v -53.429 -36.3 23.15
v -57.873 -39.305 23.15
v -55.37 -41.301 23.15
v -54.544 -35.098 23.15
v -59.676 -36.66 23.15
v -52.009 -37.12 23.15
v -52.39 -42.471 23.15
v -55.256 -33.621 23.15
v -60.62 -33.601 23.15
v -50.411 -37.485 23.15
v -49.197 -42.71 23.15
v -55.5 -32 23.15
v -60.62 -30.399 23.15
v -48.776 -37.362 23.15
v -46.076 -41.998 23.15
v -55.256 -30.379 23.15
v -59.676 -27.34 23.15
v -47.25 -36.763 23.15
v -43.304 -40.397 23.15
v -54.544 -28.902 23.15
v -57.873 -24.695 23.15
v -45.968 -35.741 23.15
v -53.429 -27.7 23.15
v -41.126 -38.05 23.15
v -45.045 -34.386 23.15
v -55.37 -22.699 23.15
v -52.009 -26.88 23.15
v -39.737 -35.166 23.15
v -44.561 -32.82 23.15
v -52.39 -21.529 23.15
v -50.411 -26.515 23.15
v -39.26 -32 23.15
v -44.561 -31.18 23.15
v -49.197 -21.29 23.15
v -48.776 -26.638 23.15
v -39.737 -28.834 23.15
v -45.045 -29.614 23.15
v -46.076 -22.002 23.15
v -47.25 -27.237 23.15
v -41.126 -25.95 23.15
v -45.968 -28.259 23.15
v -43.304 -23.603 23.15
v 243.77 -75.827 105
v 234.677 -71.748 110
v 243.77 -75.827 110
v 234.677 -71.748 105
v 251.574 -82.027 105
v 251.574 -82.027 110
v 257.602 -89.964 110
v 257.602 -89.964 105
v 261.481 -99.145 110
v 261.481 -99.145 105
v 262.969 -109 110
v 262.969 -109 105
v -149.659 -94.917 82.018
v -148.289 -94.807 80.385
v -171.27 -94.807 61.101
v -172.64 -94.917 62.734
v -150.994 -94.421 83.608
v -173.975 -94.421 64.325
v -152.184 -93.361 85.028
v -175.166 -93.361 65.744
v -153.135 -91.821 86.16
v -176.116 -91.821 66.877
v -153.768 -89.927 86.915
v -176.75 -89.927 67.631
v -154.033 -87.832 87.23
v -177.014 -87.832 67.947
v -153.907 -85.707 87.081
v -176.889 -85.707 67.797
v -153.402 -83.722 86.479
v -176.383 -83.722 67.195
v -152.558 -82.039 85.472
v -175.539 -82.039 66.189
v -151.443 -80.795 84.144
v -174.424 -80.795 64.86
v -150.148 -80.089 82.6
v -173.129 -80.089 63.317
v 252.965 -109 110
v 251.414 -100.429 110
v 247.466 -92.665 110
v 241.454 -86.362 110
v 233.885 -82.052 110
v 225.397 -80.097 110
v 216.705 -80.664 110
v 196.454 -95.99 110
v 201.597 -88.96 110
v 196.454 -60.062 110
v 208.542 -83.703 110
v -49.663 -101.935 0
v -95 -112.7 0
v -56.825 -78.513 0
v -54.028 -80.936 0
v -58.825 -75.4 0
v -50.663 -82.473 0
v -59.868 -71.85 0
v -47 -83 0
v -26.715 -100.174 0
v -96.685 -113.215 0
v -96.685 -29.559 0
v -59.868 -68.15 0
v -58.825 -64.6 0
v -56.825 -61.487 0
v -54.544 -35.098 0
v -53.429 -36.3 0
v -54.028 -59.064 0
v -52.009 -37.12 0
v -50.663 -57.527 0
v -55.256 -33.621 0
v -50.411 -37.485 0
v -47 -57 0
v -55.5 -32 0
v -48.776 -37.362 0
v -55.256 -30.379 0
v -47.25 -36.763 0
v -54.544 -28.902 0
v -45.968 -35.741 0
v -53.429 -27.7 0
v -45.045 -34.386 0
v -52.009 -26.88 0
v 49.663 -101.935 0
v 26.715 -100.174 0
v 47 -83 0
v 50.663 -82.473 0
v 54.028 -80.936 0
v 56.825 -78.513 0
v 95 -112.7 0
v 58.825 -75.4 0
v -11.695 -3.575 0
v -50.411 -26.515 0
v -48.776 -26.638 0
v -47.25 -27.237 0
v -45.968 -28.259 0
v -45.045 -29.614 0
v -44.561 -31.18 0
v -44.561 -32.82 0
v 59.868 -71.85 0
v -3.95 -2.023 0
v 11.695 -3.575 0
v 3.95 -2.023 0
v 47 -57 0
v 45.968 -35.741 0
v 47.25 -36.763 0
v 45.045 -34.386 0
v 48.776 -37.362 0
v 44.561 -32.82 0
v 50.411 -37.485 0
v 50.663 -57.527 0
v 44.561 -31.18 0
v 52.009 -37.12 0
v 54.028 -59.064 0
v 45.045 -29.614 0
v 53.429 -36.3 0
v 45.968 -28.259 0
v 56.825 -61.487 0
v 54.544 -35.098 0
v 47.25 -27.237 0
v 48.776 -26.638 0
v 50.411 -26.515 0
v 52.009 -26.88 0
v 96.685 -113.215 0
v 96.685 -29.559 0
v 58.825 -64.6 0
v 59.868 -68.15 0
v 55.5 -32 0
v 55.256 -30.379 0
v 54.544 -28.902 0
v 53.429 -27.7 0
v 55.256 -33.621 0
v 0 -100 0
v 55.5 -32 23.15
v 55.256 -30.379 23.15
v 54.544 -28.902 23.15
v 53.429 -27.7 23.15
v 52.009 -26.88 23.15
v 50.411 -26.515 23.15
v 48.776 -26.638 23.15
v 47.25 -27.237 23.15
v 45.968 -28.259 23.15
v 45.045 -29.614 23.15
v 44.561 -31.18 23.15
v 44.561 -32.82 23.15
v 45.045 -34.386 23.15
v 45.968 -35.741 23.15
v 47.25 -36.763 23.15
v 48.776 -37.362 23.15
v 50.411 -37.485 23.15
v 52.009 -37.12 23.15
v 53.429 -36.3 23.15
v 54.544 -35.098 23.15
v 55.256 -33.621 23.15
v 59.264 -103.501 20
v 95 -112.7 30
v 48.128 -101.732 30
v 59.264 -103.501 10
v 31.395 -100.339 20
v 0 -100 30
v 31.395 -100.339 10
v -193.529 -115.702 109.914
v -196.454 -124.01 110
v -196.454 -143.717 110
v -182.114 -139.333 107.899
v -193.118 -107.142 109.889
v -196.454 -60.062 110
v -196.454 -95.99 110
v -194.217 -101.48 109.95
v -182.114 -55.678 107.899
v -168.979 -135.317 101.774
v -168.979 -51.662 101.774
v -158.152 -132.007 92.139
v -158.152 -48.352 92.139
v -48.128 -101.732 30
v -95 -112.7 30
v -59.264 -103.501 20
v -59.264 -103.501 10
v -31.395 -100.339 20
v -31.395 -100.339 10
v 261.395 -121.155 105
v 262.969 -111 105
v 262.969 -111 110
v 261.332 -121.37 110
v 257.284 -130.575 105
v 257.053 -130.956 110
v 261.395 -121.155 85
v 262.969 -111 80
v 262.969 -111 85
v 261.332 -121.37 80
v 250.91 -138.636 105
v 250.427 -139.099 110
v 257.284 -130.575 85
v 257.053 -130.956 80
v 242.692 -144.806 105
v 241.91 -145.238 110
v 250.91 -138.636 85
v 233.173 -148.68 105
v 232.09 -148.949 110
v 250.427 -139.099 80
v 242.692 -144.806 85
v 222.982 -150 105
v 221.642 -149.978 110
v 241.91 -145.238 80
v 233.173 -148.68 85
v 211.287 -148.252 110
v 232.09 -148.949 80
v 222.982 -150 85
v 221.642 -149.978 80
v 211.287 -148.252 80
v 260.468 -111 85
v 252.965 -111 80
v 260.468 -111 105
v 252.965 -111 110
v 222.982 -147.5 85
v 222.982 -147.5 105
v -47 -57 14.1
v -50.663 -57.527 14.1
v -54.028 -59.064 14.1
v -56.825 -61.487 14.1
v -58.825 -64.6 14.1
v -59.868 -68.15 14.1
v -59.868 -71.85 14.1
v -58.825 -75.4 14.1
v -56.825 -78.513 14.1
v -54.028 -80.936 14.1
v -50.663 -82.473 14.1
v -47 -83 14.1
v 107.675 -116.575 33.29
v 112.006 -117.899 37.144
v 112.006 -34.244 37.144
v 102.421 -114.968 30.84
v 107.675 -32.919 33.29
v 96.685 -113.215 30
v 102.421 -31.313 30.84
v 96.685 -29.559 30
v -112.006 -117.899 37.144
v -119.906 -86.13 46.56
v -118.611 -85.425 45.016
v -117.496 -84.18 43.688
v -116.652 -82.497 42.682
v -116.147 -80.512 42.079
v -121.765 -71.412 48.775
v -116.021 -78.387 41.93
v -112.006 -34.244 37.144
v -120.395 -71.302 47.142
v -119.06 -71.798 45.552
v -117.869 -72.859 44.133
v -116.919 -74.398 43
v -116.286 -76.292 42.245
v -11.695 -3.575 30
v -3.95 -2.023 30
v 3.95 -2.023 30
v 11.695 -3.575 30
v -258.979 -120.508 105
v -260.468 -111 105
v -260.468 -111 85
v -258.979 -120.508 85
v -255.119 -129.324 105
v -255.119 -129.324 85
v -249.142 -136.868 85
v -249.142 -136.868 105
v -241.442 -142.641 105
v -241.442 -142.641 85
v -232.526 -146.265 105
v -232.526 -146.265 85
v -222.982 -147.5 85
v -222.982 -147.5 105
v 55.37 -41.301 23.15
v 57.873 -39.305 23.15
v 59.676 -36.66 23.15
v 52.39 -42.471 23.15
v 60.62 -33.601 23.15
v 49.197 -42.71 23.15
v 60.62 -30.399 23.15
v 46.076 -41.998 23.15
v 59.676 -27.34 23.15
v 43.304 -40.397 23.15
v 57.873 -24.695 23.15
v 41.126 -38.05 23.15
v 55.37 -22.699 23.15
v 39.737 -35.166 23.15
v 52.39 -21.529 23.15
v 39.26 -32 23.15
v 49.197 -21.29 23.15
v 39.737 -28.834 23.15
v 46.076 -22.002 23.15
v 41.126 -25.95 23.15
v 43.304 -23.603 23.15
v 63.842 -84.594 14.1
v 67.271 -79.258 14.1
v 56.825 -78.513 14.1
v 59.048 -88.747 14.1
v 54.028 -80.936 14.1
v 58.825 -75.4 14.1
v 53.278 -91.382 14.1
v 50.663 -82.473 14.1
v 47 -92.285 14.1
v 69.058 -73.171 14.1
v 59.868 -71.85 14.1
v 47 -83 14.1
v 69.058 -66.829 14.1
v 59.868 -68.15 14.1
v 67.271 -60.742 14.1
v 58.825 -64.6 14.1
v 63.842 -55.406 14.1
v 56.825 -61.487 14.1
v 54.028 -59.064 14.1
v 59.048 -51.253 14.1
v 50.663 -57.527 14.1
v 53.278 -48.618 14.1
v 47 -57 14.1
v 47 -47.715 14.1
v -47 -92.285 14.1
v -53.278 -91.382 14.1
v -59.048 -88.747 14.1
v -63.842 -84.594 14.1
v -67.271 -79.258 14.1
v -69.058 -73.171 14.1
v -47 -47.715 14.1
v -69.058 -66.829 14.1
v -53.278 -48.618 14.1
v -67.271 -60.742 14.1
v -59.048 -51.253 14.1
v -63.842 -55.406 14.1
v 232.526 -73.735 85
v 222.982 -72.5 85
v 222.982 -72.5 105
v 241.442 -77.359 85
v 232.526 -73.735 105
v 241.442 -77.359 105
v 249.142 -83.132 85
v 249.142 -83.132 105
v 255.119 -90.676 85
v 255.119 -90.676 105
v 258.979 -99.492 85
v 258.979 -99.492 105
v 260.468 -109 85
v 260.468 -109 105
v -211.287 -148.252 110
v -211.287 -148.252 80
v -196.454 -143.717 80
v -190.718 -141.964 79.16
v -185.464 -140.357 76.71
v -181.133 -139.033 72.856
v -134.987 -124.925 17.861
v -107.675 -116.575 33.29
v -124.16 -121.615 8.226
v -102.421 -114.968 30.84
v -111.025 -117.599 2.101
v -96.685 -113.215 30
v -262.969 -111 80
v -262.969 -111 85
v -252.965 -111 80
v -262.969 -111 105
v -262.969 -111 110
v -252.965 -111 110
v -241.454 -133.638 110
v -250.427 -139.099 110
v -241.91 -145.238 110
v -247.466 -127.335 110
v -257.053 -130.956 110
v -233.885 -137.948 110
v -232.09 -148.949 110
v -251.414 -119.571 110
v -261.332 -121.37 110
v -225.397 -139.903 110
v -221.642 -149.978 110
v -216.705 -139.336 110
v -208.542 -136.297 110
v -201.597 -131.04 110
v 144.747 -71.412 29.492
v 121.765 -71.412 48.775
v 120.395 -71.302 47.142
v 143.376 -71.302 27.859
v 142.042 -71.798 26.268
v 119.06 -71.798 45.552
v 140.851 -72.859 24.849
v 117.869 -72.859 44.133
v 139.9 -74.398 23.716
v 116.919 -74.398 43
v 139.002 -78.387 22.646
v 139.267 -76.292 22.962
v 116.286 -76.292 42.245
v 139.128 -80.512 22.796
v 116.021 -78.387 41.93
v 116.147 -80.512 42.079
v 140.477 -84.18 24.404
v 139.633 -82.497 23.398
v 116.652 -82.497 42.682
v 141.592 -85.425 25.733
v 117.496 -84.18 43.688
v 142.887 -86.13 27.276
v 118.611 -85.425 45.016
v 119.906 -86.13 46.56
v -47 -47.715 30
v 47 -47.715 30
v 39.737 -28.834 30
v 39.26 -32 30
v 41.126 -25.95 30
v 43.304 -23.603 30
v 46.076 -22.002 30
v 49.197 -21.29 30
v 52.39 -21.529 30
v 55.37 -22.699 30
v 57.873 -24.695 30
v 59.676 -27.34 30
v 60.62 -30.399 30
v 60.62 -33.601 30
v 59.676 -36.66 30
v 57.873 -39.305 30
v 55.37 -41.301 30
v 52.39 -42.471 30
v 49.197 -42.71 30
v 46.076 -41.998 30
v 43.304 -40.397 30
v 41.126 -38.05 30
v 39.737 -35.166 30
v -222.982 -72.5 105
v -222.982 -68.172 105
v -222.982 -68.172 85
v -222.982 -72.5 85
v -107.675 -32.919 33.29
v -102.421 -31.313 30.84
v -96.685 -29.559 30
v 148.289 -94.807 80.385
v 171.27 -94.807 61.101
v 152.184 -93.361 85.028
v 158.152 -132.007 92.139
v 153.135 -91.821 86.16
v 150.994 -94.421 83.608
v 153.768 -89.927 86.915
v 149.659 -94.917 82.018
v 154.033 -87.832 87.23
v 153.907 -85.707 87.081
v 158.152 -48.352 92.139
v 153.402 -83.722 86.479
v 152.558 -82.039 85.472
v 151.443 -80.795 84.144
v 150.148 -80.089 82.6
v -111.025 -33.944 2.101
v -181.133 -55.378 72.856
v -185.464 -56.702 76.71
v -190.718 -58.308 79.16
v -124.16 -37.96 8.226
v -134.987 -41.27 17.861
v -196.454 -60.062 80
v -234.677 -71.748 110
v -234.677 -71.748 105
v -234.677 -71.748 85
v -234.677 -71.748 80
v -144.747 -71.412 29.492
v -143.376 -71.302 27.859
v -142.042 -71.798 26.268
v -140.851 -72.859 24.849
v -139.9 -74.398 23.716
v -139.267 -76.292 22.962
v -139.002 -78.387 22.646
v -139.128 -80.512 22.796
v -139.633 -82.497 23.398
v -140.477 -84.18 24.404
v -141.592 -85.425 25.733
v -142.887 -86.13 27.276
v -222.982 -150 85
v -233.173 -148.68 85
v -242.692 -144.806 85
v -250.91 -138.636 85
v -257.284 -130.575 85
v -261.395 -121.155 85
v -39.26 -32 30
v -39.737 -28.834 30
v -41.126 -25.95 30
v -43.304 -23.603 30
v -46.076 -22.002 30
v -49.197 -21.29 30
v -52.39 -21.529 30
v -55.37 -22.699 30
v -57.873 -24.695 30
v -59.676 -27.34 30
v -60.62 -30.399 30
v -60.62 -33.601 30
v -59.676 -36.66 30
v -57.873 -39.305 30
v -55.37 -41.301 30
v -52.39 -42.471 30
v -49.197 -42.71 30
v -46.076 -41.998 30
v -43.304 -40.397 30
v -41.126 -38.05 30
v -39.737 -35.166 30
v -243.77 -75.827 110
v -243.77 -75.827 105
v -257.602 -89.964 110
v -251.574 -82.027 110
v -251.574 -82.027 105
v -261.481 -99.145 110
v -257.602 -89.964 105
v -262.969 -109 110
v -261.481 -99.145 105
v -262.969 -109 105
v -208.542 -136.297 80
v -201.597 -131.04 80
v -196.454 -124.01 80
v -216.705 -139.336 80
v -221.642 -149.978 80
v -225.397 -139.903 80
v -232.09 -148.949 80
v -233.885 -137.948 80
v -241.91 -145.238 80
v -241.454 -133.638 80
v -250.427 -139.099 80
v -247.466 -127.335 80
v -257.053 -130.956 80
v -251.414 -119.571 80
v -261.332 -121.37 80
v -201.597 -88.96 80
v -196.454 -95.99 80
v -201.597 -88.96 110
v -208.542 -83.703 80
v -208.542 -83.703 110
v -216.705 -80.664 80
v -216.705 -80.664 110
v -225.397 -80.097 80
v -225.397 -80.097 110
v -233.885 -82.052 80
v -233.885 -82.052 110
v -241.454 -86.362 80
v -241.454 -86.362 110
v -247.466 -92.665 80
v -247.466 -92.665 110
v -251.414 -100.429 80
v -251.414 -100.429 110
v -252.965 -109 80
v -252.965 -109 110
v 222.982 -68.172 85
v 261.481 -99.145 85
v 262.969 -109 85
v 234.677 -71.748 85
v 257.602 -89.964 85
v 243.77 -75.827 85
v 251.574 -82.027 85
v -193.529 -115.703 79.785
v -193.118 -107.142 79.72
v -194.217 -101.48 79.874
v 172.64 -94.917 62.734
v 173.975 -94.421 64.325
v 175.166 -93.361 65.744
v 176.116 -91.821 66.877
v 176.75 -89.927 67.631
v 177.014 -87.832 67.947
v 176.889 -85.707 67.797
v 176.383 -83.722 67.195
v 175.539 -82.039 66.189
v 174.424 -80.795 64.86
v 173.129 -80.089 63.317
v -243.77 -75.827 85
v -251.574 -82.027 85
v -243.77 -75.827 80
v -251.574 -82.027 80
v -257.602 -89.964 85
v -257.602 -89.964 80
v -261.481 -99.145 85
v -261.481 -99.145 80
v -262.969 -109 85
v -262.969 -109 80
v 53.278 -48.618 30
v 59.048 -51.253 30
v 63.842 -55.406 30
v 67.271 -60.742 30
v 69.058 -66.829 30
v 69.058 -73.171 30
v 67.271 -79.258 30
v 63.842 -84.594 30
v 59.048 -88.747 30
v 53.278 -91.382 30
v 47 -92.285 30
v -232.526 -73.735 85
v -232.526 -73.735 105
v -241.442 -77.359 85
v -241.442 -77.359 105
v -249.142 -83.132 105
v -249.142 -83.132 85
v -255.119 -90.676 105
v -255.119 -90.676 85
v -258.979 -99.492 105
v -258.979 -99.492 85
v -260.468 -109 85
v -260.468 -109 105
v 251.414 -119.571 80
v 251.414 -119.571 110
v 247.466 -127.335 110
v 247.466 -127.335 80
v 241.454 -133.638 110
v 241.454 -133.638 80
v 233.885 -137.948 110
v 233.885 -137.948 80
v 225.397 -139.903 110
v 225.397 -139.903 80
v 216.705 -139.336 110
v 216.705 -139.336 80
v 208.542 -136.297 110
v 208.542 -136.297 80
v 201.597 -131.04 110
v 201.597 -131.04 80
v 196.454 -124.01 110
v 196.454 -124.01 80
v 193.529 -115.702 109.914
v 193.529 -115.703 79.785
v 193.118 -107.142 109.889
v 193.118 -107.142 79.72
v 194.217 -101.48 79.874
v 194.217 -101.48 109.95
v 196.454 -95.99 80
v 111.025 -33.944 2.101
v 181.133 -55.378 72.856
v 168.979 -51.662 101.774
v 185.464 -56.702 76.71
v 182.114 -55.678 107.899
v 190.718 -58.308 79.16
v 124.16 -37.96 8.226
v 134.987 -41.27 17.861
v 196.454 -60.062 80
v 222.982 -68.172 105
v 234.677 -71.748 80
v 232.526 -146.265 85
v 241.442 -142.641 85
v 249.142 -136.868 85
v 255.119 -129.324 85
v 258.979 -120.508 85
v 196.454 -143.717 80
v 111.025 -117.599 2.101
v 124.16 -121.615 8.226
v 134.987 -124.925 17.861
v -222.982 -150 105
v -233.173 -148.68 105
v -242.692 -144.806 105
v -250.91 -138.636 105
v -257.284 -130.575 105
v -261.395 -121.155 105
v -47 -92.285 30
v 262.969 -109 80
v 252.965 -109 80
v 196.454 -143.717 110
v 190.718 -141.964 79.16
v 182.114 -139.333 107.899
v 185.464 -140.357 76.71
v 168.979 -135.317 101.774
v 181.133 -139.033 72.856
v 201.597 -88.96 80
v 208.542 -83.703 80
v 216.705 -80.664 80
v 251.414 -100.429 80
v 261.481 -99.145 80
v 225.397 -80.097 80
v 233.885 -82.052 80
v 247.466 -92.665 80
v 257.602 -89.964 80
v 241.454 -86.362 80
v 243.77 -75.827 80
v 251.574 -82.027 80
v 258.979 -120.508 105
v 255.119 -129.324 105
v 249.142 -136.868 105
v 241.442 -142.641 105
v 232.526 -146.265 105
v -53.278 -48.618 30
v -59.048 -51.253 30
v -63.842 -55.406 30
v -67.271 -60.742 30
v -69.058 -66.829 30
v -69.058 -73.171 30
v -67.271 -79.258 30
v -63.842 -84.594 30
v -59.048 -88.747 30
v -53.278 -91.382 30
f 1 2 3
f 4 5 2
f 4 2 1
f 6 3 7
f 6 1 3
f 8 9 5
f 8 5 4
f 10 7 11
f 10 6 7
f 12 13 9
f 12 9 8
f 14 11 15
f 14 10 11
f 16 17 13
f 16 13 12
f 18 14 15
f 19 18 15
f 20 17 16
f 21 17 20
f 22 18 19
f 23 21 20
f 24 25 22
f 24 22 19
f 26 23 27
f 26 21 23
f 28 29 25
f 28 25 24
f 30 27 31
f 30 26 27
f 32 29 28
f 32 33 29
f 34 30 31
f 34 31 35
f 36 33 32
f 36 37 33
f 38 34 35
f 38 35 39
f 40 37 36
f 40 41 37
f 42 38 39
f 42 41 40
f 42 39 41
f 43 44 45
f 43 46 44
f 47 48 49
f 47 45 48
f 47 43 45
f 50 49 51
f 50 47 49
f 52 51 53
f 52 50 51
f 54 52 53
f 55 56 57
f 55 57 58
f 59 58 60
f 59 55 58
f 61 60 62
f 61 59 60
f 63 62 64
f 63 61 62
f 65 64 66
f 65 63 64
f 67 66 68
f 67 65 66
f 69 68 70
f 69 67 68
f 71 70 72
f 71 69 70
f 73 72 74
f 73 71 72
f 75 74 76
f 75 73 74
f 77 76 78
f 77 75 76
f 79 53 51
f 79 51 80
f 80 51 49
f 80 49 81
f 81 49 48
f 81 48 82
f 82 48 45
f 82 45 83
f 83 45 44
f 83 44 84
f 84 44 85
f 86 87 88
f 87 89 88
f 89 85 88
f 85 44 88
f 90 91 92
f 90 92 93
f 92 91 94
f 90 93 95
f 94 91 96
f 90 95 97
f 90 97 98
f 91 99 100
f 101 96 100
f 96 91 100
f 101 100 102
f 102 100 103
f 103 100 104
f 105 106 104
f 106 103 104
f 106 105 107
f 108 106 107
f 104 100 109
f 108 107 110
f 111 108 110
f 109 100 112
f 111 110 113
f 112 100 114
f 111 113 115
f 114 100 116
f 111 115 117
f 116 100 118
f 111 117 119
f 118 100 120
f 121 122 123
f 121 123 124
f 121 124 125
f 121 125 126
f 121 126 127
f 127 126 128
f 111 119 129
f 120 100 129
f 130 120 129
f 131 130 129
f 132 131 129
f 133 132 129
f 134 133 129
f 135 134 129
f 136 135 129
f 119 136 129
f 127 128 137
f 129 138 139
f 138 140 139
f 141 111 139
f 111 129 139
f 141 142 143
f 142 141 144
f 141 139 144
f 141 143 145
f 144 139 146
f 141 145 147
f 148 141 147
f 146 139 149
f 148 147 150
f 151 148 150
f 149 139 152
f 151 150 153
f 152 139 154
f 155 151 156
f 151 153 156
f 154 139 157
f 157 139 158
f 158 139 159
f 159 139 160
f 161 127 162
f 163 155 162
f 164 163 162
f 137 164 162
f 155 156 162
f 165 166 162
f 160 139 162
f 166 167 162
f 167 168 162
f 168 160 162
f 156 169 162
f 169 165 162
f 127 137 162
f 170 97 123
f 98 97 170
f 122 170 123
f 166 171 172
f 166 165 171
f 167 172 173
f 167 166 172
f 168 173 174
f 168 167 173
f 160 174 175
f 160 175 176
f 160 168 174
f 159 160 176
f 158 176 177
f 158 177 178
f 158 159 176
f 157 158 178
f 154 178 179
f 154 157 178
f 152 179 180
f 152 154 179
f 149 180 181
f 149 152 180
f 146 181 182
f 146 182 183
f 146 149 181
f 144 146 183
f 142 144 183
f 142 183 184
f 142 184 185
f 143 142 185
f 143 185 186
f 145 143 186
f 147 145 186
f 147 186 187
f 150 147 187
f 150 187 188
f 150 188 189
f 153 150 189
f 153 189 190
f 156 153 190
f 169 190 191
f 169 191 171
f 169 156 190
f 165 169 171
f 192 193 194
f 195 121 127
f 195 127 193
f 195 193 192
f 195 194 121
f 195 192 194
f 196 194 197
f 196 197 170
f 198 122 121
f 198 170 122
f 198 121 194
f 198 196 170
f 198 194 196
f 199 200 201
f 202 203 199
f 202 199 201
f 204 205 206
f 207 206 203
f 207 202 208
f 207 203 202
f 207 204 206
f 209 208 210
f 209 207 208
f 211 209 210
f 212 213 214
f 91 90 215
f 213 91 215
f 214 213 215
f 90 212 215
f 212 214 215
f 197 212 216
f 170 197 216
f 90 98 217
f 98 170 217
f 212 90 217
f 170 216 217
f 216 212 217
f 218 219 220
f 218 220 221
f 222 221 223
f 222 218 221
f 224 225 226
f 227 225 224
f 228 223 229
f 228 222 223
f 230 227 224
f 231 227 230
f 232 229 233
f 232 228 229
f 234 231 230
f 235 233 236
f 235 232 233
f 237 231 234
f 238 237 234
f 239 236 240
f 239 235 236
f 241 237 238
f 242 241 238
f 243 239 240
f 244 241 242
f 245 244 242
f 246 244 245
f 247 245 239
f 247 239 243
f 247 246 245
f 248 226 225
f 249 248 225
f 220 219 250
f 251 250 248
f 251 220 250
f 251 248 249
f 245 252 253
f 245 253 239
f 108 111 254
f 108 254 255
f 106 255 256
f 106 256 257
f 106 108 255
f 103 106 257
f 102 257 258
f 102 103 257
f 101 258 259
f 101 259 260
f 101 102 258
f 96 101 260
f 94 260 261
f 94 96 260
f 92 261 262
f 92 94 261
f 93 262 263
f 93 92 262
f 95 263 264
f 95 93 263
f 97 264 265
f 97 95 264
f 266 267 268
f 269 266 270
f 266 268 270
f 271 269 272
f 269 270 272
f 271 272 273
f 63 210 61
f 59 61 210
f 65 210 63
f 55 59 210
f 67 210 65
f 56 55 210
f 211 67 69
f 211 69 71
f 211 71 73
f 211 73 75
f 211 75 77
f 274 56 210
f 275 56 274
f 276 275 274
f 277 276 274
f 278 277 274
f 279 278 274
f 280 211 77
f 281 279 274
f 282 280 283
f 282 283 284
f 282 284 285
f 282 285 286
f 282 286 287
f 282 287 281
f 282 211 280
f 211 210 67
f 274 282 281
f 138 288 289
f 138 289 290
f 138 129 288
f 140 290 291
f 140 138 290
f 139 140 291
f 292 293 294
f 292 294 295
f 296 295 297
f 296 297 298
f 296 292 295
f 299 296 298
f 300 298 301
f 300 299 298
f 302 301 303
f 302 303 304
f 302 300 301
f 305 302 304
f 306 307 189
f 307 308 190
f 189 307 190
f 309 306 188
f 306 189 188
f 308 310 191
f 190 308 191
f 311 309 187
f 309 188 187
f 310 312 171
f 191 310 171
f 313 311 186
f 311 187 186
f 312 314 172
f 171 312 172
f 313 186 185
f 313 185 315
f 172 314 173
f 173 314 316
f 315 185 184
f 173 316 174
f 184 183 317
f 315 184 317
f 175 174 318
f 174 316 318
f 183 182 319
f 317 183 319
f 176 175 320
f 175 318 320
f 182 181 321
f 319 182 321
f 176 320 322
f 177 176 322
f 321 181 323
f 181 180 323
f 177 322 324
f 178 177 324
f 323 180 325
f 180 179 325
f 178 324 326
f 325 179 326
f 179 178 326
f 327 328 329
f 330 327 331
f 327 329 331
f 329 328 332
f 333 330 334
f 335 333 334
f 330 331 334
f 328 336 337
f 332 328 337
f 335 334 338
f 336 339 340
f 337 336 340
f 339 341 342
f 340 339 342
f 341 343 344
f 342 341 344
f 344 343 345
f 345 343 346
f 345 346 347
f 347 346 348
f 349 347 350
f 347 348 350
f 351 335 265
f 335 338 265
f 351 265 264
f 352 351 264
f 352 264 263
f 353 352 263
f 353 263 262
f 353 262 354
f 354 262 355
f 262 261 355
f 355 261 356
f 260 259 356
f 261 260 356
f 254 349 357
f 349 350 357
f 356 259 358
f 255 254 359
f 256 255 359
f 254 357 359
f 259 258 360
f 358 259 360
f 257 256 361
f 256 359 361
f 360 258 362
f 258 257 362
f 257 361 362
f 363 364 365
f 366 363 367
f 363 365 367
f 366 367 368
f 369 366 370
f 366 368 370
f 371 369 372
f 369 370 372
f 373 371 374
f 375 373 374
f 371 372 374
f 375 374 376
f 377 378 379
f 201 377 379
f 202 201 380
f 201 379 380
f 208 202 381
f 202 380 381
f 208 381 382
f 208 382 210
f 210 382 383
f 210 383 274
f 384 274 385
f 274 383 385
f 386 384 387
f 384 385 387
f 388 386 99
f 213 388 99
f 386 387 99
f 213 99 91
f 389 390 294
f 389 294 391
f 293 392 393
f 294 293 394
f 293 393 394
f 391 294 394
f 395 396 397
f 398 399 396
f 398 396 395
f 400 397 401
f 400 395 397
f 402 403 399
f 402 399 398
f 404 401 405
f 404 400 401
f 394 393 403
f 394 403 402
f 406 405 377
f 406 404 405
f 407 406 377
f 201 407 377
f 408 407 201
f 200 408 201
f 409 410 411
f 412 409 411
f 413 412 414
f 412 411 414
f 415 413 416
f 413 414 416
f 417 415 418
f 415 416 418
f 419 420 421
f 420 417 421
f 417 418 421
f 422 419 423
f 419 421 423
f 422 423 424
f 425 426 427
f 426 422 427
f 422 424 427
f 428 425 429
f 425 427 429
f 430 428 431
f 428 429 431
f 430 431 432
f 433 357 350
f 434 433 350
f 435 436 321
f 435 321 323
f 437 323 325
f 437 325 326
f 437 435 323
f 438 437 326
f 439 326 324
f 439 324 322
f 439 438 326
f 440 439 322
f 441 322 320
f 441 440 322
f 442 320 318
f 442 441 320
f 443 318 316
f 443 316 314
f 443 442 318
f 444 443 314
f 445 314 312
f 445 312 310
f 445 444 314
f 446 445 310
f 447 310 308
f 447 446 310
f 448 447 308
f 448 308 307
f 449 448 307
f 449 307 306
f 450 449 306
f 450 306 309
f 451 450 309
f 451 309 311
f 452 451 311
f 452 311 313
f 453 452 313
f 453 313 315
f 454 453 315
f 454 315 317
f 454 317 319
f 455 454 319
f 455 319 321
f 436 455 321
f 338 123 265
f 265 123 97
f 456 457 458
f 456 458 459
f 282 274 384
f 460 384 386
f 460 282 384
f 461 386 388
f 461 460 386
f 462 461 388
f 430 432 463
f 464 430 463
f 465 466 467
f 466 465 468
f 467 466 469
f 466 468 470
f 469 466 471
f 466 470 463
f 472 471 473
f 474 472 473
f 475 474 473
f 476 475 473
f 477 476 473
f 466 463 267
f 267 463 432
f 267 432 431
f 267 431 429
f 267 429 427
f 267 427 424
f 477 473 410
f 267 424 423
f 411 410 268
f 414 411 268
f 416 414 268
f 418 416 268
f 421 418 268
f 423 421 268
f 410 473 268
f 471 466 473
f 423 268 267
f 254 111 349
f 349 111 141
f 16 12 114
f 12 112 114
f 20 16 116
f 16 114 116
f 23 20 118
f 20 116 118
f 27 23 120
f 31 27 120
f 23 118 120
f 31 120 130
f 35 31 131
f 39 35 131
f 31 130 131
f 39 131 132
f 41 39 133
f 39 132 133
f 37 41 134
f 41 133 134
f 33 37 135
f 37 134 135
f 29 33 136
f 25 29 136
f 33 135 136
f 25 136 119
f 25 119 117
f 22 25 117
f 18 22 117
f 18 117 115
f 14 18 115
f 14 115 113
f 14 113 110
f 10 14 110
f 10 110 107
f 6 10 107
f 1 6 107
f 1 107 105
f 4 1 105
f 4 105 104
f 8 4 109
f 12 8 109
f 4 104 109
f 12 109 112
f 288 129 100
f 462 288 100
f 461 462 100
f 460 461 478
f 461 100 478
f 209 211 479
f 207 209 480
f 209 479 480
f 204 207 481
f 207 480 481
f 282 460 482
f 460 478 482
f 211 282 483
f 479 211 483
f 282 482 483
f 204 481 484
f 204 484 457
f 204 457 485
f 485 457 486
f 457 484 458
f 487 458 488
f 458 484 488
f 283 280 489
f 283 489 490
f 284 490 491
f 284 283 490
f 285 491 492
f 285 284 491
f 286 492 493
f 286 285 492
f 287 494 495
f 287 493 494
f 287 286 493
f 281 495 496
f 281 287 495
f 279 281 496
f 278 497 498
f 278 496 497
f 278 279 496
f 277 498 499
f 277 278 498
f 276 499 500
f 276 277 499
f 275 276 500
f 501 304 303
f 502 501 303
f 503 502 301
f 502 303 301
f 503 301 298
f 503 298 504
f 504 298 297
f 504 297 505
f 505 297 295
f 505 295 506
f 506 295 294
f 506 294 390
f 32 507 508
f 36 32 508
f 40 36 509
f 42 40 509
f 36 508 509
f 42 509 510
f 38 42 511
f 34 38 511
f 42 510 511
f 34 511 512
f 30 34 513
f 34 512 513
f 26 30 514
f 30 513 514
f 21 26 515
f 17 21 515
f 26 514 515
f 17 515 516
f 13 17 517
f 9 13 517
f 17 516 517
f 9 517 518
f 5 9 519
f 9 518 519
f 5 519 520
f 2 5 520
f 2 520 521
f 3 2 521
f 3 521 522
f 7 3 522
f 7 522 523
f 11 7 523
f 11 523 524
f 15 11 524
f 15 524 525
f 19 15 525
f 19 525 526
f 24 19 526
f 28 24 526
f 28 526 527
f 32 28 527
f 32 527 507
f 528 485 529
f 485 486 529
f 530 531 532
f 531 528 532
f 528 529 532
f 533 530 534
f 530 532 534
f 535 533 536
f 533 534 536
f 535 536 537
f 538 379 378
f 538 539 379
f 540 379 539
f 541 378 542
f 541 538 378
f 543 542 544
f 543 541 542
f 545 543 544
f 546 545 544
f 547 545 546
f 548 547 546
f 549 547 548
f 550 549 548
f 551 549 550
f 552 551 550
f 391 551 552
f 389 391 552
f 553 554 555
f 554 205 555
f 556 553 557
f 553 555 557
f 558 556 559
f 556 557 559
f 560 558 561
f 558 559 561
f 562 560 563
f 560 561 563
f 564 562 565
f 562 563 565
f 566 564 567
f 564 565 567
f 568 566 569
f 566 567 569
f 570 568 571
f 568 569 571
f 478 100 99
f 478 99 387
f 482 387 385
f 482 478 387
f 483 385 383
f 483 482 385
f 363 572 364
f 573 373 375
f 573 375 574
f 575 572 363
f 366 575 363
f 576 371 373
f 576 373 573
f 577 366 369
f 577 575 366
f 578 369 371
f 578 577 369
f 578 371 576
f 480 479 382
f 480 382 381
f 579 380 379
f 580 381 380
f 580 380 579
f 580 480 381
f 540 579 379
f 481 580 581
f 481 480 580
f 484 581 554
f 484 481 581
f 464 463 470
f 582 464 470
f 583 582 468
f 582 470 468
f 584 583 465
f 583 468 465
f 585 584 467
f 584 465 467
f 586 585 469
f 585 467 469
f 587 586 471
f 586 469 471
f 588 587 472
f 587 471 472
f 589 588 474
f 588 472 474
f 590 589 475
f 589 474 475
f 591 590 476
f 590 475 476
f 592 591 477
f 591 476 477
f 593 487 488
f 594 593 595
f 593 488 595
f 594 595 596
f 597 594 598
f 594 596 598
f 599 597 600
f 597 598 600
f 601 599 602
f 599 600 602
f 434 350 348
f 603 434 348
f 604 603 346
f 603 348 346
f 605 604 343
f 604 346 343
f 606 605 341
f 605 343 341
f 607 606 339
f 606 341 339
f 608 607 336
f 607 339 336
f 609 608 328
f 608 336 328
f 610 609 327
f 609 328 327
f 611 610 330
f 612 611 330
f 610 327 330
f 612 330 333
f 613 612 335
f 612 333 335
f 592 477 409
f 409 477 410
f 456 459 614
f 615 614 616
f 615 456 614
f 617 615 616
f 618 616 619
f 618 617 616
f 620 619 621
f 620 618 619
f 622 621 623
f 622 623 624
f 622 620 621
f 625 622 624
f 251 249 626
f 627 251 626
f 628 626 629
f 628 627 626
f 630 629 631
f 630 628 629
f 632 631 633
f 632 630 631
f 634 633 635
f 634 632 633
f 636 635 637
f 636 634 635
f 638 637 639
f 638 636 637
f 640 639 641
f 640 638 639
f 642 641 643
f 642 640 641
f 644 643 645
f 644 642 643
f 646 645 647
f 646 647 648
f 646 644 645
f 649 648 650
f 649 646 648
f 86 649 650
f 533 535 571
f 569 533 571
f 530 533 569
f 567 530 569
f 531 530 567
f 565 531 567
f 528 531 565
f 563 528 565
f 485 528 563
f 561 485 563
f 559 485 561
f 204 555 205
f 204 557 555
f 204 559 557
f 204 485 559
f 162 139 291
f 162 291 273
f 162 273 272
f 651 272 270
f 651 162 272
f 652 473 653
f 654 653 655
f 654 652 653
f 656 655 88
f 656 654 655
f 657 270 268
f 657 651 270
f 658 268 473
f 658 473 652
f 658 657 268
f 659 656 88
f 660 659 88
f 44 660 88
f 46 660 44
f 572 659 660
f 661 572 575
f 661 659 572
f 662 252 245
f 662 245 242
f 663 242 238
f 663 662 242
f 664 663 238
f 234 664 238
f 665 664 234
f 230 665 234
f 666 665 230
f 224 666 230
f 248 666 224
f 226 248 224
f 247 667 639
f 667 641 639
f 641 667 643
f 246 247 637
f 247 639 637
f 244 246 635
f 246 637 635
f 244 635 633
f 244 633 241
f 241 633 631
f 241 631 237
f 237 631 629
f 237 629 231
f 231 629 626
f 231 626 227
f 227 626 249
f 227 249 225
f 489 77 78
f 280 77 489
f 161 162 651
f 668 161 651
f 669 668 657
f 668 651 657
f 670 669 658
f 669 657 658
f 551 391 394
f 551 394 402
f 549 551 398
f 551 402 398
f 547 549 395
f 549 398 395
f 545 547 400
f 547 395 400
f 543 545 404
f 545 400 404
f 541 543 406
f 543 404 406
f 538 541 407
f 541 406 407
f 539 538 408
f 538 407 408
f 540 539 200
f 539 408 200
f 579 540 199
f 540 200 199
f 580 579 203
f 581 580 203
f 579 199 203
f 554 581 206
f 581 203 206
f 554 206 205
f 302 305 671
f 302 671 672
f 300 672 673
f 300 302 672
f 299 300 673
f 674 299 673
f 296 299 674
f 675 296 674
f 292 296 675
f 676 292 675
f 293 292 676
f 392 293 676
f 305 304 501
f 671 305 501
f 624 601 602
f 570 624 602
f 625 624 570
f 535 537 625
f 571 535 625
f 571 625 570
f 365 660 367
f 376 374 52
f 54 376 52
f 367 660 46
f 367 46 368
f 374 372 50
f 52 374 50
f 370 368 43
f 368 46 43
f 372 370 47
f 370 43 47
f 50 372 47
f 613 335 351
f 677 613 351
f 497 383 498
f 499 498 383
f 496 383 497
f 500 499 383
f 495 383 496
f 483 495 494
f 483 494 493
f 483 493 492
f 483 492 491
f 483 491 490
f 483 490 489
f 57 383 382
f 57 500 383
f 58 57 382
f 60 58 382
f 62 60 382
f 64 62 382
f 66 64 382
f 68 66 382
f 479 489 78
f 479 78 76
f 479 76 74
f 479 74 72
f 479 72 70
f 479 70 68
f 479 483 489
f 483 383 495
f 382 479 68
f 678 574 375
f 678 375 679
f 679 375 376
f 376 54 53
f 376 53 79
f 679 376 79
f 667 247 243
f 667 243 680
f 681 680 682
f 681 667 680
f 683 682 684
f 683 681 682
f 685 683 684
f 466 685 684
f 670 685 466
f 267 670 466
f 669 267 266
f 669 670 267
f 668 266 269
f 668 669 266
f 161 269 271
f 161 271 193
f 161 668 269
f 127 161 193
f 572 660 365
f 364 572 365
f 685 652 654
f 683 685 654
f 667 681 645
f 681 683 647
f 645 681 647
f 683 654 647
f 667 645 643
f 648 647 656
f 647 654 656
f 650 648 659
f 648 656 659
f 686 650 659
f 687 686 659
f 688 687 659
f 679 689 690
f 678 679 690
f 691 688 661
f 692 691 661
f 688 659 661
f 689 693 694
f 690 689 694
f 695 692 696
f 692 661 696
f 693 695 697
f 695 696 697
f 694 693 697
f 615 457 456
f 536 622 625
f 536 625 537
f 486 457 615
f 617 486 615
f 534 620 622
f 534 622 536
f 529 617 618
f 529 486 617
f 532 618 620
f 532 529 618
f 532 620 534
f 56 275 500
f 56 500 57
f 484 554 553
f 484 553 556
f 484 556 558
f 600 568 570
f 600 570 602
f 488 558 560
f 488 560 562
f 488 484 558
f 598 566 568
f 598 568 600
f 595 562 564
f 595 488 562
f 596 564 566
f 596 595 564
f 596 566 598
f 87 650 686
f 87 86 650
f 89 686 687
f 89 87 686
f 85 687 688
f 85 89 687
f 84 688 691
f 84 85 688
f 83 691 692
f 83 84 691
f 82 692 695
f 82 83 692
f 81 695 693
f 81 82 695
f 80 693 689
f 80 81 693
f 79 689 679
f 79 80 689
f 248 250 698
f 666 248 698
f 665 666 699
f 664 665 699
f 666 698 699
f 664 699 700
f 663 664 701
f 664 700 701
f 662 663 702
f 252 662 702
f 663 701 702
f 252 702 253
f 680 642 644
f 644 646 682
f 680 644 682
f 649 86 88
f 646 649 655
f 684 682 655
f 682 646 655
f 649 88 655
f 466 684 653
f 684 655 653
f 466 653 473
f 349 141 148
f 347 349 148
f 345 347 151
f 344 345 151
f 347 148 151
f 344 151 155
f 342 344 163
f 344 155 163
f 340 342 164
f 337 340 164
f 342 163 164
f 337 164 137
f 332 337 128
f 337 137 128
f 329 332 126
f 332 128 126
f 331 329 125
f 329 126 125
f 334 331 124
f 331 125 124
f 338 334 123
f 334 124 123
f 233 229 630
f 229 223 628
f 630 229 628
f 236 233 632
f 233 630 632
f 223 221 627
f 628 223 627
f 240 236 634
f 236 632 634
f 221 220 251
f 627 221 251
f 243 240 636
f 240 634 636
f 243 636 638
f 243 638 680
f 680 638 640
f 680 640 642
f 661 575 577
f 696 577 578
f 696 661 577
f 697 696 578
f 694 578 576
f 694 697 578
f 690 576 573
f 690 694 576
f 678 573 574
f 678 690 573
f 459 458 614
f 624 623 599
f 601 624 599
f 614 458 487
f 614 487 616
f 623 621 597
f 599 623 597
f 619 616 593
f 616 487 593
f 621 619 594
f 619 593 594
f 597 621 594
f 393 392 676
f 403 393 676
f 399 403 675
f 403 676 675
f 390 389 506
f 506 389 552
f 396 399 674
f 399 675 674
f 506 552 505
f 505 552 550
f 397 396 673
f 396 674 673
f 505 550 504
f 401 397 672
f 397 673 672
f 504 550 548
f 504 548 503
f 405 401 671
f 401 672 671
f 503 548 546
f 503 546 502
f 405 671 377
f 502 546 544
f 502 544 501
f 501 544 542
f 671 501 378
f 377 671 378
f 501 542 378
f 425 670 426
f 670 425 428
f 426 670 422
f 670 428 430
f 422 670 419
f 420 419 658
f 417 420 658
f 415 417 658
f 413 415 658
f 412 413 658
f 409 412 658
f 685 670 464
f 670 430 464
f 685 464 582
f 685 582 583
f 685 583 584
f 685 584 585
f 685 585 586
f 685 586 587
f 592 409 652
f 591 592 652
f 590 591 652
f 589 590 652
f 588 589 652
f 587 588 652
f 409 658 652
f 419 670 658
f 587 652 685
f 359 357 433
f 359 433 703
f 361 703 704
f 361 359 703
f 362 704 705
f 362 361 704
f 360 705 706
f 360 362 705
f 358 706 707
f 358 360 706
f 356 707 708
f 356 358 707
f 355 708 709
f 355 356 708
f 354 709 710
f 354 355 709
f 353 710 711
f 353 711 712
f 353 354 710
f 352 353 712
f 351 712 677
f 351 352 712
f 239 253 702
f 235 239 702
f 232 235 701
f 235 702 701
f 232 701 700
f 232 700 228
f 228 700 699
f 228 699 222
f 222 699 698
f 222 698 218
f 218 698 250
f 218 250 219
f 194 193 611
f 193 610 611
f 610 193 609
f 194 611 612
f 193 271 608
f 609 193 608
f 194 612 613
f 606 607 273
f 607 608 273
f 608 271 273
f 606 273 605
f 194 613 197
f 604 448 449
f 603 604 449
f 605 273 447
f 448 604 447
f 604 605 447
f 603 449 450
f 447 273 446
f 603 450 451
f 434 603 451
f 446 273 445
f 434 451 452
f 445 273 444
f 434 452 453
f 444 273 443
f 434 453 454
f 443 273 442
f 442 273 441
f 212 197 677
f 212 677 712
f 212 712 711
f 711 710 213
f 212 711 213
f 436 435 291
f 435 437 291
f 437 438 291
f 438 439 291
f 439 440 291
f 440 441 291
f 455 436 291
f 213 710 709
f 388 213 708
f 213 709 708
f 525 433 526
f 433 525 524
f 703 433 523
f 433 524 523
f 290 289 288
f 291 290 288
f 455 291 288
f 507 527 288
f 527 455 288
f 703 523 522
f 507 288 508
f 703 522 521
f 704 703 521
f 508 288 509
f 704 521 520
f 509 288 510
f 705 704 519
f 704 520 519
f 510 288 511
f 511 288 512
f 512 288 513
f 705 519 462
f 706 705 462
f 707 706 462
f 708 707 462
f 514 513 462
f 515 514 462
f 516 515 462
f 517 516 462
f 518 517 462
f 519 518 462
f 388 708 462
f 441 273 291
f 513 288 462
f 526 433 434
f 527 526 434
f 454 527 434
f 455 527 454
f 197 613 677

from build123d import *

# Parameters (mm, degrees)
EXTRUDE_THIN1_DEPTH                       = 150
SKETCH2_OUTSIDE_W                         = 349.23
SKETCH2_OUTSIDE_H                         = 219.23
CUT_EXTRUDE1_DEPTH                        = 337.154726279
SKETCH3_R                                 = 30
CUT_EXTRUDE2_DEPTH                        = 323.116973634
CUT_EXTRUDE3_START                        = -15
CUT_EXTRUDE3_DEPTH                        = 10
SKETCH5_W                                 = 100
SKETCH5_H                                 = 2
CUT_EXTRUDE4_DEPTH                        = 323.116973634
CBORE_START                               = 14.1
CBORE_SLOT_FOR_M24_HEX_HEAD_BOLT1_DEPTH   = 15.9
CBORE_SLOT_FOR_M24_HEX_HEAD_BOLT1_2_DEPTH = 14.1
CBORE_FOR_M10_HEX_HEAD_BOLT1_D            = 11
CBORE_FOR_M10_HEX_HEAD_BOLT1_CBORE_D      = 21.48
CBORE_FOR_M10_HEX_HEAD_BOLT1_CBORE_DEPTH  = 6.85
CUT_EXTRUDE5_DEPTH                        = 303.31664336
FILLET1_R                                 = 40


# Read off the part's stored shape, not the designer's step: CBORE SLOT for M24 Hex Head Bolt1
with BuildPart() as part:
    # Sketch1 → Extrude-Thin1 (new body)
    with BuildSketch(Plane(origin=(0, 0, 0), x_dir=(1, 0, 0), z_dir=(0, 1, 0))):
        with BuildLine():
            Line((0, 0), (-96.684617092, 0))
            ThreePointArc((-96.684617092, 0), (-117.815530179, -4.684610648), (-134.986839248, -17.860619516))
            Line((-134.986839248, -17.860619516), (-181.133234795, -72.855752194))
            ThreePointArc((-181.133234795, -72.855752194), (-188.001758422, -78.126155741), (-196.454123657, -80))
            Line((-196.454123657, -80), (-280, -80))
            Line((-280, -80), (-280, -110))
            Line((-280, -110), (-196.454123657, -110))
            ThreePointArc((-196.454123657, -110), (-175.32321057, -105.315389352), (-158.151901501, -92.139380484))
            Line((-158.151901501, -92.139380484), (-112.005505955, -37.144247806))
            ThreePointArc((-112.005505955, -37.144247806), (-105.136982327, -31.873844259), (-96.684617092, -30))
            Line((-96.684617092, -30), (0, -30))
            Line((0, -30), (0, 0))
        make_face()
    extrude(amount=-EXTRUDE_THIN1_DEPTH)

    # Sketch2 outside → Cut-Extrude1 (cut, through all)
    with BuildSketch(Plane.XY):
        with Locations((-140, -75)):
            Rectangle(SKETCH2_OUTSIDE_W, SKETCH2_OUTSIDE_H)
        with BuildLine():
            Line((0, 0), (-234.676511429, -71.747809761))
            ThreePointArc((-234.676511429, -71.747809761), (-261.233833478, -121.694868189), (-211.286775051, -148.252190239))
            Line((-211.286775051, -148.252190239), (-95, -112.699755258))
            add(Edge.make_bspline(
                [(-95, -112.699755258), (-51.532544729, -99.410420536), (-36.95554526, -100), (0, -100)],
                knots=[0, 0, 0, 0, 1, 1, 1, 1], degree=3))
            Line((0, -100), (0, 0))
        make_face(mode=Mode.SUBTRACT)
    extrude(amount=CUT_EXTRUDE1_DEPTH, mode=Mode.SUBTRACT)

    # Sketch3 → Cut-Extrude2 (cut, through all)
    with BuildSketch(Plane.XY.offset(110)):
        with Locations(Location((-222.98164324, -110, 0), (0, 0, 27.840553026))):
            Circle(SKETCH3_R)
    extrude(amount=-CUT_EXTRUDE2_DEPTH, mode=Mode.SUBTRACT)

    # Sketch4 → Cut-Extrude3 (cut, symmetric)
    with BuildSketch(Plane.XY.offset(110).offset(CUT_EXTRUDE3_START)):
        with BuildLine():
            Line((-222.98164324, -68.172329741), (-222.98164324, -72.5))
            ThreePointArc((-222.98164324, -72.5), (-260.48164324, -110), (-222.98164324, -147.5))
            Line((-222.98164324, -147.5), (-222.98164324, -150))
            ThreePointArc((-222.98164324, -150), (-262.542277774, -115.912376445), (-234.676511429, -71.747809761))
            Line((-234.676511429, -71.747809761), (-222.98164324, -68.172329741))
        make_face()
    extrude(amount=CUT_EXTRUDE3_DEPTH, both=True, mode=Mode.SUBTRACT)

    # Sketch5 → Cut-Extrude4 (cut, through all)
    with BuildSketch(Plane.XY.offset(110)):
        with Locations((-272.98164324, -110)):
            Rectangle(SKETCH5_W, SKETCH5_H)
    extrude(amount=-CUT_EXTRUDE4_DEPTH, mode=Mode.SUBTRACT)

    # CBORE SLOT for M24 Hex Head Bolt1 outlin → CBORE SLOT for M24 Hex Head Bolt1 (cut)
    with BuildSketch(Plane.XY.offset(CBORE_START)):
        with BuildLine():
            Line((0, -47.715), (-47, -47.715))
            ThreePointArc((-47, -47.715), (-69.285, -70), (-47, -92.285))
            Line((-47, -92.285), (0, -92.285))
            Line((0, -92.285), (0, -47.715))
        make_face()
    extrude(amount=CBORE_SLOT_FOR_M24_HEX_HEAD_BOLT1_DEPTH, mode=Mode.SUBTRACT)

    # CBORE SLOT for M24 Hex Head Bolt1 2 outl → CBORE SLOT for M24 Hex Head Bolt1 2 (cut)
    with BuildSketch(Plane.XY):
        with BuildLine():
            Line((0, -83), (0, -57))
            Line((0, -57), (-47, -57))
            ThreePointArc((-47, -57), (-60, -70), (-47, -83))
            Line((-47, -83), (0, -83))
        make_face()
    extrude(amount=CBORE_SLOT_FOR_M24_HEX_HEAD_BOLT1_2_DEPTH, mode=Mode.SUBTRACT)

    # CBORE for M10 Hex Head Bolt1 (through all)
    with Locations(Plane.XY.offset(30)):
        with Locations((-50, -32)):
            CounterBoreHole(CBORE_FOR_M10_HEX_HEAD_BOLT1_D / 2, CBORE_FOR_M10_HEX_HEAD_BOLT1_CBORE_D / 2, CBORE_FOR_M10_HEX_HEAD_BOLT1_CBORE_DEPTH)

    # Sketch11 → Cut-Extrude5 (cut, through all)
    with BuildSketch(Plane(origin=(-47.437557366, 0, -39.80483689), x_dir=(0.6427876096865384, 0, -0.7660444431189788), z_dir=(0.7660444431189788, 0, 0.6427876096865384))):
        with BuildLine():
            Line((-159.78881321, -80.089014291), (-115.633379107, -71.411593064))
            ThreePointArc((-115.633379107, -71.411593064), (-106.827903218, -77.32459521), (-112.740905364, -86.130071099))
            Line((-112.740905364, -86.130071099), (-156.896339468, -94.807492326))
            ThreePointArc((-156.896339468, -94.807492326), (-165.701815356, -88.89449018), (-159.78881321, -80.089014291))
        make_face()
    extrude(amount=-CUT_EXTRUDE5_DEPTH, mode=Mode.SUBTRACT)

    # Mirror1: part across plane


with BuildPart() as part_1:
    add(part.part)
    add(part.part.mirror(Plane(origin=(0, -150, 0), x_dir=(0, 0, 1), z_dir=(-1, 0, 0))))

    # Fillet1
    fillet1_edges = [part_1.edges().sort_by_distance(p)[0] for p in [
        (0, 0, 15),
    ]]
    fillet(fillet1_edges, radius=FILLET1_R)


solid = part_1.part
